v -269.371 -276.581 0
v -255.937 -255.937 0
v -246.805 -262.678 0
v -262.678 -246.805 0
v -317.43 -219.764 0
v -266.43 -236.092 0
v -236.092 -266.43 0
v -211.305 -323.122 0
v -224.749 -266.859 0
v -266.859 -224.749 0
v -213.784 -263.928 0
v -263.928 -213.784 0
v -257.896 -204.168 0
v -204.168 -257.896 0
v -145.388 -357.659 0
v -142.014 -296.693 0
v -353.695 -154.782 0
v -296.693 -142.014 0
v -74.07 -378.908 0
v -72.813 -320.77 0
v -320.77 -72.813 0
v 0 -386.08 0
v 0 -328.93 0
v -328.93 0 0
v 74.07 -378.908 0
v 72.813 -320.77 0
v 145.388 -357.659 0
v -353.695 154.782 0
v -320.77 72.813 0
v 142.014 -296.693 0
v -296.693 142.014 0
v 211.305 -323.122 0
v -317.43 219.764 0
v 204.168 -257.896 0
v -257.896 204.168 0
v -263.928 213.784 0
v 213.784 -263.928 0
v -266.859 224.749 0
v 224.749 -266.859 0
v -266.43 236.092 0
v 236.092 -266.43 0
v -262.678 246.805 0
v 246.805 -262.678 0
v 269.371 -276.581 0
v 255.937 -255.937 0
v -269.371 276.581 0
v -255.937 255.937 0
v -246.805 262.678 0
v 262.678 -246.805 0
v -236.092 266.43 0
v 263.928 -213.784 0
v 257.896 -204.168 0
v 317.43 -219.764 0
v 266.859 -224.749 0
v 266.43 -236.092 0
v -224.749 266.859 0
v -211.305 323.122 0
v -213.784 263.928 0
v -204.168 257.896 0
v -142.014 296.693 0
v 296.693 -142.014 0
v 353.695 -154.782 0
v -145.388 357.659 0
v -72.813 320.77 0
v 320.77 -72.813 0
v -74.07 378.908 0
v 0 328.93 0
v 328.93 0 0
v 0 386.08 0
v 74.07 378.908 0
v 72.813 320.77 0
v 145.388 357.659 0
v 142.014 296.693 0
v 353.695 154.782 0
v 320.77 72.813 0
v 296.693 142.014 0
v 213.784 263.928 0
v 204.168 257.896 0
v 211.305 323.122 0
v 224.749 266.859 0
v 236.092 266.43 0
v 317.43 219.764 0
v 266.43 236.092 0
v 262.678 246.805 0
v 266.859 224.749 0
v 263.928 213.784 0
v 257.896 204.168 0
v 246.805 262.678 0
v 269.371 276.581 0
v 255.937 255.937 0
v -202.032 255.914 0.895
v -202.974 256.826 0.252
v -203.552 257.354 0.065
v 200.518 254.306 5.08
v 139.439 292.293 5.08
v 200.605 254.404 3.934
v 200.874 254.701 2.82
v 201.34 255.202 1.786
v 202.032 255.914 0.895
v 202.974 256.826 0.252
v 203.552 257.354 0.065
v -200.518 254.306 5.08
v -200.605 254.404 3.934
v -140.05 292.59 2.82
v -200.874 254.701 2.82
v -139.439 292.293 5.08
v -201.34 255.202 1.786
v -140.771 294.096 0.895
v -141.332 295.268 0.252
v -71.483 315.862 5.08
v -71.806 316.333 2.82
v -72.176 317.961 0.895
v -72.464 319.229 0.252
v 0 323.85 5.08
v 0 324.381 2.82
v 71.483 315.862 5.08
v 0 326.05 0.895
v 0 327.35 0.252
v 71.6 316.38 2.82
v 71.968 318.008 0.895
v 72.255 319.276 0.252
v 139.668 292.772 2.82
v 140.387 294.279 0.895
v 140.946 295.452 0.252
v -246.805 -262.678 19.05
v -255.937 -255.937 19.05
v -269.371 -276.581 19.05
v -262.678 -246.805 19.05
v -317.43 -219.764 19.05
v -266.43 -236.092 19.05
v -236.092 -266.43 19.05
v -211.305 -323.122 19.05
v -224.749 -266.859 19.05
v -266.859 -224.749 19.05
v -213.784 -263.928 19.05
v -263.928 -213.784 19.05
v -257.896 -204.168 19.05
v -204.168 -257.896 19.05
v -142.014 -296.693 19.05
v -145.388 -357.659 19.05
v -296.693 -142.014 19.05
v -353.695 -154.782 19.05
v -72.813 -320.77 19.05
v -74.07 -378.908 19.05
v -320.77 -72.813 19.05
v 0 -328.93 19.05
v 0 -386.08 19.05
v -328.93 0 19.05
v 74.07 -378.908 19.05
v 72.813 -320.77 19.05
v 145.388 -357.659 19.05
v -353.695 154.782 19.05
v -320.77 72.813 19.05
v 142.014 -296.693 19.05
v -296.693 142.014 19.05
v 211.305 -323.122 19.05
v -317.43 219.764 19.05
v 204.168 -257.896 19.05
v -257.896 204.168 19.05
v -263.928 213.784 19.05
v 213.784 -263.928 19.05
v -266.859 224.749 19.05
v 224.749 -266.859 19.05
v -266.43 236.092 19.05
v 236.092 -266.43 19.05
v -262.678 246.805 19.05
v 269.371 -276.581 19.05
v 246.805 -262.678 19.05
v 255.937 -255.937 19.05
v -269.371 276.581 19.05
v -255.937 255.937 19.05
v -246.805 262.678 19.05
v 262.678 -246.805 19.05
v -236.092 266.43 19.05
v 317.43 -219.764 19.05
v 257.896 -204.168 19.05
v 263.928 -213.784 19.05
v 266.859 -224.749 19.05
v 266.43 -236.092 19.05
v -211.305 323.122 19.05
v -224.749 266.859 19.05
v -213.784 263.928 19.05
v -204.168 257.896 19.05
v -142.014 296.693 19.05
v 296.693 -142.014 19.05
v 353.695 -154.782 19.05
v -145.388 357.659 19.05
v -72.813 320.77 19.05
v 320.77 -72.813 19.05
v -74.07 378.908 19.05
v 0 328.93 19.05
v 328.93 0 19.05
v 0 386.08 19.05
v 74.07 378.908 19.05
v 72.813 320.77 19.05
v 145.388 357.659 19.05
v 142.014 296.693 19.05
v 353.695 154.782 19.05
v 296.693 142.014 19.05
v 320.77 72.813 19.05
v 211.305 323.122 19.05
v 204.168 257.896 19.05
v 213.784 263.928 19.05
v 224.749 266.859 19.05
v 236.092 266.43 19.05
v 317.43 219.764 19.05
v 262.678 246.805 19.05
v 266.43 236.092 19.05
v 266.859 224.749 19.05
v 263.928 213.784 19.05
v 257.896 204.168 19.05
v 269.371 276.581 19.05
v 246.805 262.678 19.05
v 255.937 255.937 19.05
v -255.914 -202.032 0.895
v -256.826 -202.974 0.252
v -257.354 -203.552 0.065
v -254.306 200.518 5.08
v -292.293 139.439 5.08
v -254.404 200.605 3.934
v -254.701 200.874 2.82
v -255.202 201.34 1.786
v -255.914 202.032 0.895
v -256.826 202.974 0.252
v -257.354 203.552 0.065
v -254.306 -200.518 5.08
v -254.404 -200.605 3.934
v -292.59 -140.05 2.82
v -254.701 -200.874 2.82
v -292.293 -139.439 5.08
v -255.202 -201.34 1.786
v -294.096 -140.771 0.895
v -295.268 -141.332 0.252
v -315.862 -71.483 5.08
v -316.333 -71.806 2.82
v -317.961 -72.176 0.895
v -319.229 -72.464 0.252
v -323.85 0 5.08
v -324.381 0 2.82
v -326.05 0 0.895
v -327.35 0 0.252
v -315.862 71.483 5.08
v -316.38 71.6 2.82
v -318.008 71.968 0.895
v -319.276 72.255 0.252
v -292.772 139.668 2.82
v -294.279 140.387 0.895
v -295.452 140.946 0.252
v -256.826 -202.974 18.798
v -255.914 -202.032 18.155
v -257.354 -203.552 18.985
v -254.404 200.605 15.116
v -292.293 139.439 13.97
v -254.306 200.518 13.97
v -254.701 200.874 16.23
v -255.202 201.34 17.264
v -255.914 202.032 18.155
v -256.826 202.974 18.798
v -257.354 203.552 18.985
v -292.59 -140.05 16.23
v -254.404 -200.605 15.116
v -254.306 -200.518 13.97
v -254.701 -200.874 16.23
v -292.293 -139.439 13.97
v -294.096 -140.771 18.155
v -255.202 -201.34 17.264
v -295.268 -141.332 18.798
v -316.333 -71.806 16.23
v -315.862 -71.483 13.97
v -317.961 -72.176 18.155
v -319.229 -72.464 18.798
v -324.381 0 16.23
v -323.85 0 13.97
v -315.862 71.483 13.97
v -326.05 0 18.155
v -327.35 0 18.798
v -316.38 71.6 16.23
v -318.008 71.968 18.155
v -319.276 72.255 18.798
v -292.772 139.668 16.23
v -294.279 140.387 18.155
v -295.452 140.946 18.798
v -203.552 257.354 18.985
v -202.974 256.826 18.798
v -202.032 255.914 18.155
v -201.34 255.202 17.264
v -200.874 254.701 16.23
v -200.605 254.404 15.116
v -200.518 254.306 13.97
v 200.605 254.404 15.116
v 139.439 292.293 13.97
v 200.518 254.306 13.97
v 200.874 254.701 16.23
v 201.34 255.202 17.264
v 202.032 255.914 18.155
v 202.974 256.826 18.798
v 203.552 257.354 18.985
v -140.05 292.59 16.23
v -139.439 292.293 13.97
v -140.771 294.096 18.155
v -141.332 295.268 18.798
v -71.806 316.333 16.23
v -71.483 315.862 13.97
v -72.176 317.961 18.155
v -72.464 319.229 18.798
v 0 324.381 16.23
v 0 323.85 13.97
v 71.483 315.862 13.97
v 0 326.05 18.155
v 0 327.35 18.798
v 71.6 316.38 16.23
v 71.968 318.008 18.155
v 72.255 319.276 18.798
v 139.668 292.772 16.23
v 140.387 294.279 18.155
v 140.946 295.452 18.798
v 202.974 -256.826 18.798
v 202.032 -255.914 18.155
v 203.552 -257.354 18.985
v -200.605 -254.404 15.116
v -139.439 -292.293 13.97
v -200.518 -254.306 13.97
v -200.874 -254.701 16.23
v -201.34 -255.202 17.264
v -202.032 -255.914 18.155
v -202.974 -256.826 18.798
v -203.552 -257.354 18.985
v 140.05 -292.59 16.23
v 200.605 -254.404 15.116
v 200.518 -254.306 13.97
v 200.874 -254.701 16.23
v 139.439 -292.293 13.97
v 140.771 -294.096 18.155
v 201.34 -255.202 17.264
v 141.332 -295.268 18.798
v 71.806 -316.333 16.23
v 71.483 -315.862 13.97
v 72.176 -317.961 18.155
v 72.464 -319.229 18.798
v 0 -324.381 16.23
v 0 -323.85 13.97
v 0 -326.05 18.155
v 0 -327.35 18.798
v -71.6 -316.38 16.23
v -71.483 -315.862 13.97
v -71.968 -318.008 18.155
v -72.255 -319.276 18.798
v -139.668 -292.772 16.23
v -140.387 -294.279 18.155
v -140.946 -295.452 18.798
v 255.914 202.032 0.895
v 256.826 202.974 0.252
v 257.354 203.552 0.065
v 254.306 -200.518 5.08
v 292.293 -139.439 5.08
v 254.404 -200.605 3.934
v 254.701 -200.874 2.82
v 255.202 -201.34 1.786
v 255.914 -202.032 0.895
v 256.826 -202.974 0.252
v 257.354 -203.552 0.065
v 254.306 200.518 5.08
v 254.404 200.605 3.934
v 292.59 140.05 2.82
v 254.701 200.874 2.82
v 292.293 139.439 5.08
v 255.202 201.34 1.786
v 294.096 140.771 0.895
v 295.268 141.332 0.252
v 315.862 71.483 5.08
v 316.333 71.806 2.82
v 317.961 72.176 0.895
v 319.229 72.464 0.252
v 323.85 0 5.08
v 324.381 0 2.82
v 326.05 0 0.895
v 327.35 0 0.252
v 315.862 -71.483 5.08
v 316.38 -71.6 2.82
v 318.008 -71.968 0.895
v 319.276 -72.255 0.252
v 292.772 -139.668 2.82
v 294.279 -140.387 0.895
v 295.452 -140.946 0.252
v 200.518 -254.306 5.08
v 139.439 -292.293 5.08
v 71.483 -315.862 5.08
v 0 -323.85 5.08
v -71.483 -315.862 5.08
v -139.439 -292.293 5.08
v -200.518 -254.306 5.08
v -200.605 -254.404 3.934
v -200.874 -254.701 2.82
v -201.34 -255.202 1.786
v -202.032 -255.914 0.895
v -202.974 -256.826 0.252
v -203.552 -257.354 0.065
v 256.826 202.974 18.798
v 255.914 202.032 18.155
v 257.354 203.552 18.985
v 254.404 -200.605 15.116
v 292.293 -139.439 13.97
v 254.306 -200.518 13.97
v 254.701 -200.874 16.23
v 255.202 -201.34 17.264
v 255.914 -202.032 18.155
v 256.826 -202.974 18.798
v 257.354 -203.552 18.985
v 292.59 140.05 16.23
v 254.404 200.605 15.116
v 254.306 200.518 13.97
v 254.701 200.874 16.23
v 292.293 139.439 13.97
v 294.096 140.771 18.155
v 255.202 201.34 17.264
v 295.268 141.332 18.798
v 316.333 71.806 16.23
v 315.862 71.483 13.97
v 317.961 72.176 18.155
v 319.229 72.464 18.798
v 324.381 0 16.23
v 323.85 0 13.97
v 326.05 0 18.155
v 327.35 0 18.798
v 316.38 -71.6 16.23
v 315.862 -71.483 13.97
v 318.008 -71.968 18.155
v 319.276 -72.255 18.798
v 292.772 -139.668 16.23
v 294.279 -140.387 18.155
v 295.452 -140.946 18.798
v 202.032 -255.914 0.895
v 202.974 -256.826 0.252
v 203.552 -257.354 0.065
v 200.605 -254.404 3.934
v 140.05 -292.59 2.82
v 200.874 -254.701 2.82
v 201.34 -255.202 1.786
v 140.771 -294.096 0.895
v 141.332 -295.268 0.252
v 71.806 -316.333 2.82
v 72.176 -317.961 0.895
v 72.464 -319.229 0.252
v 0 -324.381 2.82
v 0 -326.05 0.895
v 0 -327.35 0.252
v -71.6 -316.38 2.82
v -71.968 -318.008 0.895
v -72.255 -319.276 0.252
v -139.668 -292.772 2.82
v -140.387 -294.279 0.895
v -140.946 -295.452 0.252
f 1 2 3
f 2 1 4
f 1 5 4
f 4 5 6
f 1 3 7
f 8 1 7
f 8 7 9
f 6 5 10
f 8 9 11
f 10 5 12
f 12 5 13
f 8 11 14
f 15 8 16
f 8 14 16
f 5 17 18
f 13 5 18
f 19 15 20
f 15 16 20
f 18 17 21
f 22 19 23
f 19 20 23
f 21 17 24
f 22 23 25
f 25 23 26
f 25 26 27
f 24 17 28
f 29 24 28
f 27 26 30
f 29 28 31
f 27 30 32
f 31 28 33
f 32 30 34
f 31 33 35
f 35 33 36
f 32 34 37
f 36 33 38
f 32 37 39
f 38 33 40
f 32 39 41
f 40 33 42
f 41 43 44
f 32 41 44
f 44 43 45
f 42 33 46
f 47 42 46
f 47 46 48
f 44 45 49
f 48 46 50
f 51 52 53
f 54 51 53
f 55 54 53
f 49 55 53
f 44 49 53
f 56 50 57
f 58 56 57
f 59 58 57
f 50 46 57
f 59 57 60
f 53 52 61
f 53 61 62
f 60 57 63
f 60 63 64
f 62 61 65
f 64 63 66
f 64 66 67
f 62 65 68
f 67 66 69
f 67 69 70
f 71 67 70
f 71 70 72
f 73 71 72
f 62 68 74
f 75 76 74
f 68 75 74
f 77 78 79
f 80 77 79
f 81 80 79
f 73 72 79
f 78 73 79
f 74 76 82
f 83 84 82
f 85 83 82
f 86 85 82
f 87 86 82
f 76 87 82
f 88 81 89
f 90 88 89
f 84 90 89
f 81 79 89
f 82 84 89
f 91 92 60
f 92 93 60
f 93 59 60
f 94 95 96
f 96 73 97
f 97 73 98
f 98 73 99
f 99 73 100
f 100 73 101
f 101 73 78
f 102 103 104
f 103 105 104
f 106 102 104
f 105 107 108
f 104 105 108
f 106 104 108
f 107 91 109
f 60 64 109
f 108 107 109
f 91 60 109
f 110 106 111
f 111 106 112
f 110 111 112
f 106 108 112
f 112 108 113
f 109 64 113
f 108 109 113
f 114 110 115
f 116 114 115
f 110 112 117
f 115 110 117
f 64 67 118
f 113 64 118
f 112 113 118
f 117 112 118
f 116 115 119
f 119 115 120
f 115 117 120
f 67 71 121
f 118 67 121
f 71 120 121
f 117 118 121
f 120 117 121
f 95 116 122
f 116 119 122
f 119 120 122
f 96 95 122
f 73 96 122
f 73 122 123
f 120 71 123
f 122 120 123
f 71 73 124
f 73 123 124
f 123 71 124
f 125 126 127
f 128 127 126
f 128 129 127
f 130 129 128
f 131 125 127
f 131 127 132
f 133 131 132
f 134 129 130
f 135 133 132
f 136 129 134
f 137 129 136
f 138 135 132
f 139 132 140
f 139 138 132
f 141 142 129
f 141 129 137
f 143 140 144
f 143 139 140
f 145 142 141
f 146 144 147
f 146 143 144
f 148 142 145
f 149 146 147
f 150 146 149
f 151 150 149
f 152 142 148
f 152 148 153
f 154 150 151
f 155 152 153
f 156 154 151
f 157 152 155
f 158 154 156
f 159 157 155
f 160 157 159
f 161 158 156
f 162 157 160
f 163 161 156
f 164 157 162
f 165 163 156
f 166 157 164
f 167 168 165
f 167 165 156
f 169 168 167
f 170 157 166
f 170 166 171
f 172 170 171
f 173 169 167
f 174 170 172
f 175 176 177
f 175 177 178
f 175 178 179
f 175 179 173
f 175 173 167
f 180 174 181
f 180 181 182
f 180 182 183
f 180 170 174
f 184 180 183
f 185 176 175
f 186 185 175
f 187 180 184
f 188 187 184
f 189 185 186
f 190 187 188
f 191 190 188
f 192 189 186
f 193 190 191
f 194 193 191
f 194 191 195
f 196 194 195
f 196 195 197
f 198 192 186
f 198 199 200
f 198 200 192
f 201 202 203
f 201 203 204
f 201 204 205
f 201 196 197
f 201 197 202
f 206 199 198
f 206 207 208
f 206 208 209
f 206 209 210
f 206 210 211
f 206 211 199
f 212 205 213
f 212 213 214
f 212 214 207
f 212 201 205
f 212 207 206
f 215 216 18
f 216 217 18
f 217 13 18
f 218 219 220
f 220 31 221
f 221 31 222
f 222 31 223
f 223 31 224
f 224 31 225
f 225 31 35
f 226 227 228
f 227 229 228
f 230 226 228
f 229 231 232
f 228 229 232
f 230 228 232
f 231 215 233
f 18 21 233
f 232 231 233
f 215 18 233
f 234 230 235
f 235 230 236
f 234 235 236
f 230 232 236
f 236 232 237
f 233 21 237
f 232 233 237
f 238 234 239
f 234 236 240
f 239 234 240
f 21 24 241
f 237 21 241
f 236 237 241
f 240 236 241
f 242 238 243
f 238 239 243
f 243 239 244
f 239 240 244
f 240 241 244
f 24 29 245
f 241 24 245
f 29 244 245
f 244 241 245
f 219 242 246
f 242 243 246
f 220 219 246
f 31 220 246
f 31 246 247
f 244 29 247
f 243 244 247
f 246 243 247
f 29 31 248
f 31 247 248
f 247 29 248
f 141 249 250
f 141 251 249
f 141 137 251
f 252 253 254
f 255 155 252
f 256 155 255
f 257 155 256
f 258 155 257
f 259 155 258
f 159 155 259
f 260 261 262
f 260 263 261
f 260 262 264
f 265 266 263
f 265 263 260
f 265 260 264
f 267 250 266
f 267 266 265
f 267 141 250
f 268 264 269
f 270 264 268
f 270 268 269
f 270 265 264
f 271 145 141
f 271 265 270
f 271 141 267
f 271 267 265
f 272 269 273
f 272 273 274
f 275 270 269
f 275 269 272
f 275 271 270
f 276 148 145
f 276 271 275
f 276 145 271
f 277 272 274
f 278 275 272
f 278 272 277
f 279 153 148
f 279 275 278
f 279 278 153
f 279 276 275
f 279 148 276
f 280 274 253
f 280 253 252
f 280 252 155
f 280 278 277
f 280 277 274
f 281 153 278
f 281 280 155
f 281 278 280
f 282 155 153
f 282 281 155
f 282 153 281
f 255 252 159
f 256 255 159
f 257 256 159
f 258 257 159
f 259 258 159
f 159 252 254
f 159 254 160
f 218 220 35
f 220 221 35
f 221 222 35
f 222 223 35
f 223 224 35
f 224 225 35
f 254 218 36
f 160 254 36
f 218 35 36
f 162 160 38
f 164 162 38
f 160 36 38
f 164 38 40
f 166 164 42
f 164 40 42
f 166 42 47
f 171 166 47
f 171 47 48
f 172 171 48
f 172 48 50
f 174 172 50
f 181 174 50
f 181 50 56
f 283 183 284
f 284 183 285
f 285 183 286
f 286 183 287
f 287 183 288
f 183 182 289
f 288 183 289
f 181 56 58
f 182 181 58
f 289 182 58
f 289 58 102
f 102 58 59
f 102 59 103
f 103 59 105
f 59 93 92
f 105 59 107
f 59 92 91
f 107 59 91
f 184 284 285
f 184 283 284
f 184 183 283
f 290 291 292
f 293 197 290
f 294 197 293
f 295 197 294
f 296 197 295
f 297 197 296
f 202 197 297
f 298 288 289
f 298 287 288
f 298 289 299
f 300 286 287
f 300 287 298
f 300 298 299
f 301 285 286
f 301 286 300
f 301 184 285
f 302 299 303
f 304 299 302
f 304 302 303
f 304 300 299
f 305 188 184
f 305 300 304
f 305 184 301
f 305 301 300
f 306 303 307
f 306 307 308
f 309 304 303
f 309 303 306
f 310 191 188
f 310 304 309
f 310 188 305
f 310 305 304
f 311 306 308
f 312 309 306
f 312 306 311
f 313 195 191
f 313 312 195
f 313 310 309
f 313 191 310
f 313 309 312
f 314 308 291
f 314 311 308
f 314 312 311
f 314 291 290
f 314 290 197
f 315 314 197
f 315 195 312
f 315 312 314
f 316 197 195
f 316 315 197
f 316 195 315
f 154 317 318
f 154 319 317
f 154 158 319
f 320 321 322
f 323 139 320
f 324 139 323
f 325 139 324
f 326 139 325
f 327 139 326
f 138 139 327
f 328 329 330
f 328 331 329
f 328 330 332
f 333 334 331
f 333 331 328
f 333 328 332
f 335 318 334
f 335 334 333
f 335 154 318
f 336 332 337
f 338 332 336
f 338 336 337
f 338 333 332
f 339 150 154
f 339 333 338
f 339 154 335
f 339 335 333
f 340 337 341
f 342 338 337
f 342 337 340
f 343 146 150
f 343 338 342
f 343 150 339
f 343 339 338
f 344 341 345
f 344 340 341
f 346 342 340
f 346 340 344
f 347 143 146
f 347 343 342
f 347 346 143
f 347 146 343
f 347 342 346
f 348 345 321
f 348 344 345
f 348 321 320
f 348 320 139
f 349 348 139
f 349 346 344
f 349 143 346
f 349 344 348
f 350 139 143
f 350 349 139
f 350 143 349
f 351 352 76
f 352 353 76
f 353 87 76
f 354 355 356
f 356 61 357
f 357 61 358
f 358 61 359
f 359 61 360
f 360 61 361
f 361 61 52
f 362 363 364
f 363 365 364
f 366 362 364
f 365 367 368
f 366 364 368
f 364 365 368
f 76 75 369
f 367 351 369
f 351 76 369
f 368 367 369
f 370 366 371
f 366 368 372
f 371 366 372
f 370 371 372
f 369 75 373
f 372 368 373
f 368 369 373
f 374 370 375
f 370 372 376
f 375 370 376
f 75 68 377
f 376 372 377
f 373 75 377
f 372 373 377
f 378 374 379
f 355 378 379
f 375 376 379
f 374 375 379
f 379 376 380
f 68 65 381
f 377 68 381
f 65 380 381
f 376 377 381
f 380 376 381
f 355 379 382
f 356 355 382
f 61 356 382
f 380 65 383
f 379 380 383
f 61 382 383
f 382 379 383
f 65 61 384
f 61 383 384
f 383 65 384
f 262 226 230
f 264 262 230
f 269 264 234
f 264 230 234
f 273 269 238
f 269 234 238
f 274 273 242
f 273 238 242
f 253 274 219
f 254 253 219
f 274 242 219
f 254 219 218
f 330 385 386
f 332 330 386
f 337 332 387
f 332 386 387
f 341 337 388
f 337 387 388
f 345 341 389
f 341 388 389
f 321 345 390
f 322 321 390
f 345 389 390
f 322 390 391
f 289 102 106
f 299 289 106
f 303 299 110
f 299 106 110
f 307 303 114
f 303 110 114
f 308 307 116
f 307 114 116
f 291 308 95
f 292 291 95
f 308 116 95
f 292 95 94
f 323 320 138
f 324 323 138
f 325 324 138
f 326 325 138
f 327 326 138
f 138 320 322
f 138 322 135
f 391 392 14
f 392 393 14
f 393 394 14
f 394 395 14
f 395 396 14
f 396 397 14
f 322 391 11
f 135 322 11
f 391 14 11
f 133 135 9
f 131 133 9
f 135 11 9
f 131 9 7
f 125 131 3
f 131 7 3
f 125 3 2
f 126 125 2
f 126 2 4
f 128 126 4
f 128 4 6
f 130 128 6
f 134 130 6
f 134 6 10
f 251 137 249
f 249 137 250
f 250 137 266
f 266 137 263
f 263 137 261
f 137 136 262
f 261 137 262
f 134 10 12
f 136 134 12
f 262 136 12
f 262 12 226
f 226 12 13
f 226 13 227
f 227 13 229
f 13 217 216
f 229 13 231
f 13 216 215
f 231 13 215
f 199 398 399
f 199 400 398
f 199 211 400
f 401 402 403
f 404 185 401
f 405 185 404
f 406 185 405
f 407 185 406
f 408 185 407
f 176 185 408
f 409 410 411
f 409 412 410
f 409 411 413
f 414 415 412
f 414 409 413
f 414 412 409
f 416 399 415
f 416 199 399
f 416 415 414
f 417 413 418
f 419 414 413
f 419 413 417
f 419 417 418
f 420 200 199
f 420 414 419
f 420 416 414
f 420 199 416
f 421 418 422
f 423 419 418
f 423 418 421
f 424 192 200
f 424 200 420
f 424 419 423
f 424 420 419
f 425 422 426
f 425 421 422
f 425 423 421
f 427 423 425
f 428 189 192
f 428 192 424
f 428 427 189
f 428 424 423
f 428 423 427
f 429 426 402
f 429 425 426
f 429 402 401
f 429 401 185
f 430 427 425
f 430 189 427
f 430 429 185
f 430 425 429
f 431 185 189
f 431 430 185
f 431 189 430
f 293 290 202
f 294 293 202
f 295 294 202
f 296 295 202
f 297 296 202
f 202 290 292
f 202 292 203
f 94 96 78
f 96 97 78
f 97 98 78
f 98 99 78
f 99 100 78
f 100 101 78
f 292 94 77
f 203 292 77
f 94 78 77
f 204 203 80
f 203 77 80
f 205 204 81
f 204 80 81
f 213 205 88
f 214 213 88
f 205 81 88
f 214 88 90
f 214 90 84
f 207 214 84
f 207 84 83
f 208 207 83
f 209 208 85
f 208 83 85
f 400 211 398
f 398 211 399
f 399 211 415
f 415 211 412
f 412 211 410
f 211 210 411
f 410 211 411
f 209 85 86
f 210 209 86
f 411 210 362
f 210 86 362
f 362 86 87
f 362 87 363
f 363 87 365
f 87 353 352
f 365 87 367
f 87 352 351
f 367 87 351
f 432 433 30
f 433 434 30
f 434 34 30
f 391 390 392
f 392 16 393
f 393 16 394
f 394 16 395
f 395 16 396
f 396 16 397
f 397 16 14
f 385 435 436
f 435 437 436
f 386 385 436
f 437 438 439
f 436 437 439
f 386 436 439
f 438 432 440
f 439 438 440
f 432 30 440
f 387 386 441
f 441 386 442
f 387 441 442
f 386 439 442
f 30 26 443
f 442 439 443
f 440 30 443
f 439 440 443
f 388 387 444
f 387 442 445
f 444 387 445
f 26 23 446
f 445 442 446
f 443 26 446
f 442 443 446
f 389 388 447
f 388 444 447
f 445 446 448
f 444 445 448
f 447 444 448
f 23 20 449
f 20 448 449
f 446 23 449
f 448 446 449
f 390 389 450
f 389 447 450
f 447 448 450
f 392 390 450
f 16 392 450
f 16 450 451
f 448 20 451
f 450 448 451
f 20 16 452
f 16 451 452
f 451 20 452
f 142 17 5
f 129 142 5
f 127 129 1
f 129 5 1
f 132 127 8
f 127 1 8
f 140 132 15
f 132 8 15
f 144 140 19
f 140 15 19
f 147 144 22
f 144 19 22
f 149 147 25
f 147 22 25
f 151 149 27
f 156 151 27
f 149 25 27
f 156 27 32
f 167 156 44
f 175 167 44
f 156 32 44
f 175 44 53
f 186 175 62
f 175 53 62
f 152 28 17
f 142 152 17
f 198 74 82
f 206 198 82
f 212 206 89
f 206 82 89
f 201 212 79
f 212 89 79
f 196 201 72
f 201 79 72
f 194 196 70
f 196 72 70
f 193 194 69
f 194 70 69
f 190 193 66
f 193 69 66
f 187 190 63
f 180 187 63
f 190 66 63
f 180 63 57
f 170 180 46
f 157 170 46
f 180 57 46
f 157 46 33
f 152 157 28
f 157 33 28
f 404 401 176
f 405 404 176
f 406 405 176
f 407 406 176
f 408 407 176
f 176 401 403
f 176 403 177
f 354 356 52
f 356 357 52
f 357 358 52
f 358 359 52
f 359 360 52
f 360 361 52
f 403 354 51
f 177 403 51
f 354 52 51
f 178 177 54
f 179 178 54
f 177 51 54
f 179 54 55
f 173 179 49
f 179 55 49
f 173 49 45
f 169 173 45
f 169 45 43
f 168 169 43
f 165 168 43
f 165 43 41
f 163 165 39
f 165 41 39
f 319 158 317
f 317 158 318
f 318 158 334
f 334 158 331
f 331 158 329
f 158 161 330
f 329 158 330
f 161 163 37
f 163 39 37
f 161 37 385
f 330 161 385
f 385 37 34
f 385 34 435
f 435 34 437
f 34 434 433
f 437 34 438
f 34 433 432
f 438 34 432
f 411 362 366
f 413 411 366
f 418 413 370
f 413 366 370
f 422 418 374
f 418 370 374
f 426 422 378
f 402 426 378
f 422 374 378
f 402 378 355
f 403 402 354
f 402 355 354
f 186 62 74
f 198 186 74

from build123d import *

# Parameters (mm, degrees)
F1_DEPTH = 19.05
F2_R     = 5.08


with BuildPart() as f1:
    # F0 (on Top) → F1 (new body)
    with BuildSketch(Plane.XY):
        with BuildLine():
            Line((-353.695, 0), (-353.695, -154.782471149))
            ThreePointArc((-353.695, -154.782471149), (0, -386.08), (353.695, -154.782471149))
            Line((353.695, -154.782471149), (353.695, 0))
            Line((353.695, 0), (353.695, 154.782471149))
            ThreePointArc((353.695, 154.782471149), (0, 386.08), (-353.695, 154.782471149))
            Line((-353.695, 154.782471149), (-353.695, 0))
        make_face()
        with BuildLine():
            ThreePointArc((254.3058976541, 200.51766236), (305.9704131573, 106.1175233991), (323.85, 0))
            ThreePointArc((323.85, 0), (305.9704131573, -106.1175233991), (254.3058976541, -200.51766236))
            ThreePointArc((254.3058976541, -200.51766236), (255.9372994505, -255.9372994505), (200.51766236, -254.3058976541))
            ThreePointArc((200.51766236, -254.3058976541), (0, -323.85), (-200.51766236, -254.3058976541))
            ThreePointArc((-200.51766236, -254.3058976541), (-255.9372994505, -255.9372994505), (-254.3058976541, -200.51766236))
            ThreePointArc((-254.3058976541, -200.51766236), (-323.85, 0), (-254.3058976541, 200.51766236))
            ThreePointArc((-254.3058976541, 200.51766236), (-255.9372994505, 255.9372994505), (-200.51766236, 254.3058976541))
            ThreePointArc((-200.51766236, 254.3058976541), (0, 323.85), (200.51766236, 254.3058976541))
            ThreePointArc((200.51766236, 254.3058976541), (255.9372994505, 255.9372994505), (254.3058976541, 200.51766236))
        make_face(mode=Mode.SUBTRACT)
    extrude(amount=F1_DEPTH)

    # F2
    f2_edges = [f1.edges().sort_by_distance(p)[0] for p in [
        (0, 323.85, 19.05),
        (323.85, 0, 19.05),
        (0, 323.85, 0),
        (323.85, 0, 0),
        (0, -323.85, 19.05),
        (-323.85, 0, 19.05),
        (-323.85, 0, 0),
        (0, -323.85, 0),
    ]]
    fillet(f2_edges, radius=F2_R)


solid = f1.part
